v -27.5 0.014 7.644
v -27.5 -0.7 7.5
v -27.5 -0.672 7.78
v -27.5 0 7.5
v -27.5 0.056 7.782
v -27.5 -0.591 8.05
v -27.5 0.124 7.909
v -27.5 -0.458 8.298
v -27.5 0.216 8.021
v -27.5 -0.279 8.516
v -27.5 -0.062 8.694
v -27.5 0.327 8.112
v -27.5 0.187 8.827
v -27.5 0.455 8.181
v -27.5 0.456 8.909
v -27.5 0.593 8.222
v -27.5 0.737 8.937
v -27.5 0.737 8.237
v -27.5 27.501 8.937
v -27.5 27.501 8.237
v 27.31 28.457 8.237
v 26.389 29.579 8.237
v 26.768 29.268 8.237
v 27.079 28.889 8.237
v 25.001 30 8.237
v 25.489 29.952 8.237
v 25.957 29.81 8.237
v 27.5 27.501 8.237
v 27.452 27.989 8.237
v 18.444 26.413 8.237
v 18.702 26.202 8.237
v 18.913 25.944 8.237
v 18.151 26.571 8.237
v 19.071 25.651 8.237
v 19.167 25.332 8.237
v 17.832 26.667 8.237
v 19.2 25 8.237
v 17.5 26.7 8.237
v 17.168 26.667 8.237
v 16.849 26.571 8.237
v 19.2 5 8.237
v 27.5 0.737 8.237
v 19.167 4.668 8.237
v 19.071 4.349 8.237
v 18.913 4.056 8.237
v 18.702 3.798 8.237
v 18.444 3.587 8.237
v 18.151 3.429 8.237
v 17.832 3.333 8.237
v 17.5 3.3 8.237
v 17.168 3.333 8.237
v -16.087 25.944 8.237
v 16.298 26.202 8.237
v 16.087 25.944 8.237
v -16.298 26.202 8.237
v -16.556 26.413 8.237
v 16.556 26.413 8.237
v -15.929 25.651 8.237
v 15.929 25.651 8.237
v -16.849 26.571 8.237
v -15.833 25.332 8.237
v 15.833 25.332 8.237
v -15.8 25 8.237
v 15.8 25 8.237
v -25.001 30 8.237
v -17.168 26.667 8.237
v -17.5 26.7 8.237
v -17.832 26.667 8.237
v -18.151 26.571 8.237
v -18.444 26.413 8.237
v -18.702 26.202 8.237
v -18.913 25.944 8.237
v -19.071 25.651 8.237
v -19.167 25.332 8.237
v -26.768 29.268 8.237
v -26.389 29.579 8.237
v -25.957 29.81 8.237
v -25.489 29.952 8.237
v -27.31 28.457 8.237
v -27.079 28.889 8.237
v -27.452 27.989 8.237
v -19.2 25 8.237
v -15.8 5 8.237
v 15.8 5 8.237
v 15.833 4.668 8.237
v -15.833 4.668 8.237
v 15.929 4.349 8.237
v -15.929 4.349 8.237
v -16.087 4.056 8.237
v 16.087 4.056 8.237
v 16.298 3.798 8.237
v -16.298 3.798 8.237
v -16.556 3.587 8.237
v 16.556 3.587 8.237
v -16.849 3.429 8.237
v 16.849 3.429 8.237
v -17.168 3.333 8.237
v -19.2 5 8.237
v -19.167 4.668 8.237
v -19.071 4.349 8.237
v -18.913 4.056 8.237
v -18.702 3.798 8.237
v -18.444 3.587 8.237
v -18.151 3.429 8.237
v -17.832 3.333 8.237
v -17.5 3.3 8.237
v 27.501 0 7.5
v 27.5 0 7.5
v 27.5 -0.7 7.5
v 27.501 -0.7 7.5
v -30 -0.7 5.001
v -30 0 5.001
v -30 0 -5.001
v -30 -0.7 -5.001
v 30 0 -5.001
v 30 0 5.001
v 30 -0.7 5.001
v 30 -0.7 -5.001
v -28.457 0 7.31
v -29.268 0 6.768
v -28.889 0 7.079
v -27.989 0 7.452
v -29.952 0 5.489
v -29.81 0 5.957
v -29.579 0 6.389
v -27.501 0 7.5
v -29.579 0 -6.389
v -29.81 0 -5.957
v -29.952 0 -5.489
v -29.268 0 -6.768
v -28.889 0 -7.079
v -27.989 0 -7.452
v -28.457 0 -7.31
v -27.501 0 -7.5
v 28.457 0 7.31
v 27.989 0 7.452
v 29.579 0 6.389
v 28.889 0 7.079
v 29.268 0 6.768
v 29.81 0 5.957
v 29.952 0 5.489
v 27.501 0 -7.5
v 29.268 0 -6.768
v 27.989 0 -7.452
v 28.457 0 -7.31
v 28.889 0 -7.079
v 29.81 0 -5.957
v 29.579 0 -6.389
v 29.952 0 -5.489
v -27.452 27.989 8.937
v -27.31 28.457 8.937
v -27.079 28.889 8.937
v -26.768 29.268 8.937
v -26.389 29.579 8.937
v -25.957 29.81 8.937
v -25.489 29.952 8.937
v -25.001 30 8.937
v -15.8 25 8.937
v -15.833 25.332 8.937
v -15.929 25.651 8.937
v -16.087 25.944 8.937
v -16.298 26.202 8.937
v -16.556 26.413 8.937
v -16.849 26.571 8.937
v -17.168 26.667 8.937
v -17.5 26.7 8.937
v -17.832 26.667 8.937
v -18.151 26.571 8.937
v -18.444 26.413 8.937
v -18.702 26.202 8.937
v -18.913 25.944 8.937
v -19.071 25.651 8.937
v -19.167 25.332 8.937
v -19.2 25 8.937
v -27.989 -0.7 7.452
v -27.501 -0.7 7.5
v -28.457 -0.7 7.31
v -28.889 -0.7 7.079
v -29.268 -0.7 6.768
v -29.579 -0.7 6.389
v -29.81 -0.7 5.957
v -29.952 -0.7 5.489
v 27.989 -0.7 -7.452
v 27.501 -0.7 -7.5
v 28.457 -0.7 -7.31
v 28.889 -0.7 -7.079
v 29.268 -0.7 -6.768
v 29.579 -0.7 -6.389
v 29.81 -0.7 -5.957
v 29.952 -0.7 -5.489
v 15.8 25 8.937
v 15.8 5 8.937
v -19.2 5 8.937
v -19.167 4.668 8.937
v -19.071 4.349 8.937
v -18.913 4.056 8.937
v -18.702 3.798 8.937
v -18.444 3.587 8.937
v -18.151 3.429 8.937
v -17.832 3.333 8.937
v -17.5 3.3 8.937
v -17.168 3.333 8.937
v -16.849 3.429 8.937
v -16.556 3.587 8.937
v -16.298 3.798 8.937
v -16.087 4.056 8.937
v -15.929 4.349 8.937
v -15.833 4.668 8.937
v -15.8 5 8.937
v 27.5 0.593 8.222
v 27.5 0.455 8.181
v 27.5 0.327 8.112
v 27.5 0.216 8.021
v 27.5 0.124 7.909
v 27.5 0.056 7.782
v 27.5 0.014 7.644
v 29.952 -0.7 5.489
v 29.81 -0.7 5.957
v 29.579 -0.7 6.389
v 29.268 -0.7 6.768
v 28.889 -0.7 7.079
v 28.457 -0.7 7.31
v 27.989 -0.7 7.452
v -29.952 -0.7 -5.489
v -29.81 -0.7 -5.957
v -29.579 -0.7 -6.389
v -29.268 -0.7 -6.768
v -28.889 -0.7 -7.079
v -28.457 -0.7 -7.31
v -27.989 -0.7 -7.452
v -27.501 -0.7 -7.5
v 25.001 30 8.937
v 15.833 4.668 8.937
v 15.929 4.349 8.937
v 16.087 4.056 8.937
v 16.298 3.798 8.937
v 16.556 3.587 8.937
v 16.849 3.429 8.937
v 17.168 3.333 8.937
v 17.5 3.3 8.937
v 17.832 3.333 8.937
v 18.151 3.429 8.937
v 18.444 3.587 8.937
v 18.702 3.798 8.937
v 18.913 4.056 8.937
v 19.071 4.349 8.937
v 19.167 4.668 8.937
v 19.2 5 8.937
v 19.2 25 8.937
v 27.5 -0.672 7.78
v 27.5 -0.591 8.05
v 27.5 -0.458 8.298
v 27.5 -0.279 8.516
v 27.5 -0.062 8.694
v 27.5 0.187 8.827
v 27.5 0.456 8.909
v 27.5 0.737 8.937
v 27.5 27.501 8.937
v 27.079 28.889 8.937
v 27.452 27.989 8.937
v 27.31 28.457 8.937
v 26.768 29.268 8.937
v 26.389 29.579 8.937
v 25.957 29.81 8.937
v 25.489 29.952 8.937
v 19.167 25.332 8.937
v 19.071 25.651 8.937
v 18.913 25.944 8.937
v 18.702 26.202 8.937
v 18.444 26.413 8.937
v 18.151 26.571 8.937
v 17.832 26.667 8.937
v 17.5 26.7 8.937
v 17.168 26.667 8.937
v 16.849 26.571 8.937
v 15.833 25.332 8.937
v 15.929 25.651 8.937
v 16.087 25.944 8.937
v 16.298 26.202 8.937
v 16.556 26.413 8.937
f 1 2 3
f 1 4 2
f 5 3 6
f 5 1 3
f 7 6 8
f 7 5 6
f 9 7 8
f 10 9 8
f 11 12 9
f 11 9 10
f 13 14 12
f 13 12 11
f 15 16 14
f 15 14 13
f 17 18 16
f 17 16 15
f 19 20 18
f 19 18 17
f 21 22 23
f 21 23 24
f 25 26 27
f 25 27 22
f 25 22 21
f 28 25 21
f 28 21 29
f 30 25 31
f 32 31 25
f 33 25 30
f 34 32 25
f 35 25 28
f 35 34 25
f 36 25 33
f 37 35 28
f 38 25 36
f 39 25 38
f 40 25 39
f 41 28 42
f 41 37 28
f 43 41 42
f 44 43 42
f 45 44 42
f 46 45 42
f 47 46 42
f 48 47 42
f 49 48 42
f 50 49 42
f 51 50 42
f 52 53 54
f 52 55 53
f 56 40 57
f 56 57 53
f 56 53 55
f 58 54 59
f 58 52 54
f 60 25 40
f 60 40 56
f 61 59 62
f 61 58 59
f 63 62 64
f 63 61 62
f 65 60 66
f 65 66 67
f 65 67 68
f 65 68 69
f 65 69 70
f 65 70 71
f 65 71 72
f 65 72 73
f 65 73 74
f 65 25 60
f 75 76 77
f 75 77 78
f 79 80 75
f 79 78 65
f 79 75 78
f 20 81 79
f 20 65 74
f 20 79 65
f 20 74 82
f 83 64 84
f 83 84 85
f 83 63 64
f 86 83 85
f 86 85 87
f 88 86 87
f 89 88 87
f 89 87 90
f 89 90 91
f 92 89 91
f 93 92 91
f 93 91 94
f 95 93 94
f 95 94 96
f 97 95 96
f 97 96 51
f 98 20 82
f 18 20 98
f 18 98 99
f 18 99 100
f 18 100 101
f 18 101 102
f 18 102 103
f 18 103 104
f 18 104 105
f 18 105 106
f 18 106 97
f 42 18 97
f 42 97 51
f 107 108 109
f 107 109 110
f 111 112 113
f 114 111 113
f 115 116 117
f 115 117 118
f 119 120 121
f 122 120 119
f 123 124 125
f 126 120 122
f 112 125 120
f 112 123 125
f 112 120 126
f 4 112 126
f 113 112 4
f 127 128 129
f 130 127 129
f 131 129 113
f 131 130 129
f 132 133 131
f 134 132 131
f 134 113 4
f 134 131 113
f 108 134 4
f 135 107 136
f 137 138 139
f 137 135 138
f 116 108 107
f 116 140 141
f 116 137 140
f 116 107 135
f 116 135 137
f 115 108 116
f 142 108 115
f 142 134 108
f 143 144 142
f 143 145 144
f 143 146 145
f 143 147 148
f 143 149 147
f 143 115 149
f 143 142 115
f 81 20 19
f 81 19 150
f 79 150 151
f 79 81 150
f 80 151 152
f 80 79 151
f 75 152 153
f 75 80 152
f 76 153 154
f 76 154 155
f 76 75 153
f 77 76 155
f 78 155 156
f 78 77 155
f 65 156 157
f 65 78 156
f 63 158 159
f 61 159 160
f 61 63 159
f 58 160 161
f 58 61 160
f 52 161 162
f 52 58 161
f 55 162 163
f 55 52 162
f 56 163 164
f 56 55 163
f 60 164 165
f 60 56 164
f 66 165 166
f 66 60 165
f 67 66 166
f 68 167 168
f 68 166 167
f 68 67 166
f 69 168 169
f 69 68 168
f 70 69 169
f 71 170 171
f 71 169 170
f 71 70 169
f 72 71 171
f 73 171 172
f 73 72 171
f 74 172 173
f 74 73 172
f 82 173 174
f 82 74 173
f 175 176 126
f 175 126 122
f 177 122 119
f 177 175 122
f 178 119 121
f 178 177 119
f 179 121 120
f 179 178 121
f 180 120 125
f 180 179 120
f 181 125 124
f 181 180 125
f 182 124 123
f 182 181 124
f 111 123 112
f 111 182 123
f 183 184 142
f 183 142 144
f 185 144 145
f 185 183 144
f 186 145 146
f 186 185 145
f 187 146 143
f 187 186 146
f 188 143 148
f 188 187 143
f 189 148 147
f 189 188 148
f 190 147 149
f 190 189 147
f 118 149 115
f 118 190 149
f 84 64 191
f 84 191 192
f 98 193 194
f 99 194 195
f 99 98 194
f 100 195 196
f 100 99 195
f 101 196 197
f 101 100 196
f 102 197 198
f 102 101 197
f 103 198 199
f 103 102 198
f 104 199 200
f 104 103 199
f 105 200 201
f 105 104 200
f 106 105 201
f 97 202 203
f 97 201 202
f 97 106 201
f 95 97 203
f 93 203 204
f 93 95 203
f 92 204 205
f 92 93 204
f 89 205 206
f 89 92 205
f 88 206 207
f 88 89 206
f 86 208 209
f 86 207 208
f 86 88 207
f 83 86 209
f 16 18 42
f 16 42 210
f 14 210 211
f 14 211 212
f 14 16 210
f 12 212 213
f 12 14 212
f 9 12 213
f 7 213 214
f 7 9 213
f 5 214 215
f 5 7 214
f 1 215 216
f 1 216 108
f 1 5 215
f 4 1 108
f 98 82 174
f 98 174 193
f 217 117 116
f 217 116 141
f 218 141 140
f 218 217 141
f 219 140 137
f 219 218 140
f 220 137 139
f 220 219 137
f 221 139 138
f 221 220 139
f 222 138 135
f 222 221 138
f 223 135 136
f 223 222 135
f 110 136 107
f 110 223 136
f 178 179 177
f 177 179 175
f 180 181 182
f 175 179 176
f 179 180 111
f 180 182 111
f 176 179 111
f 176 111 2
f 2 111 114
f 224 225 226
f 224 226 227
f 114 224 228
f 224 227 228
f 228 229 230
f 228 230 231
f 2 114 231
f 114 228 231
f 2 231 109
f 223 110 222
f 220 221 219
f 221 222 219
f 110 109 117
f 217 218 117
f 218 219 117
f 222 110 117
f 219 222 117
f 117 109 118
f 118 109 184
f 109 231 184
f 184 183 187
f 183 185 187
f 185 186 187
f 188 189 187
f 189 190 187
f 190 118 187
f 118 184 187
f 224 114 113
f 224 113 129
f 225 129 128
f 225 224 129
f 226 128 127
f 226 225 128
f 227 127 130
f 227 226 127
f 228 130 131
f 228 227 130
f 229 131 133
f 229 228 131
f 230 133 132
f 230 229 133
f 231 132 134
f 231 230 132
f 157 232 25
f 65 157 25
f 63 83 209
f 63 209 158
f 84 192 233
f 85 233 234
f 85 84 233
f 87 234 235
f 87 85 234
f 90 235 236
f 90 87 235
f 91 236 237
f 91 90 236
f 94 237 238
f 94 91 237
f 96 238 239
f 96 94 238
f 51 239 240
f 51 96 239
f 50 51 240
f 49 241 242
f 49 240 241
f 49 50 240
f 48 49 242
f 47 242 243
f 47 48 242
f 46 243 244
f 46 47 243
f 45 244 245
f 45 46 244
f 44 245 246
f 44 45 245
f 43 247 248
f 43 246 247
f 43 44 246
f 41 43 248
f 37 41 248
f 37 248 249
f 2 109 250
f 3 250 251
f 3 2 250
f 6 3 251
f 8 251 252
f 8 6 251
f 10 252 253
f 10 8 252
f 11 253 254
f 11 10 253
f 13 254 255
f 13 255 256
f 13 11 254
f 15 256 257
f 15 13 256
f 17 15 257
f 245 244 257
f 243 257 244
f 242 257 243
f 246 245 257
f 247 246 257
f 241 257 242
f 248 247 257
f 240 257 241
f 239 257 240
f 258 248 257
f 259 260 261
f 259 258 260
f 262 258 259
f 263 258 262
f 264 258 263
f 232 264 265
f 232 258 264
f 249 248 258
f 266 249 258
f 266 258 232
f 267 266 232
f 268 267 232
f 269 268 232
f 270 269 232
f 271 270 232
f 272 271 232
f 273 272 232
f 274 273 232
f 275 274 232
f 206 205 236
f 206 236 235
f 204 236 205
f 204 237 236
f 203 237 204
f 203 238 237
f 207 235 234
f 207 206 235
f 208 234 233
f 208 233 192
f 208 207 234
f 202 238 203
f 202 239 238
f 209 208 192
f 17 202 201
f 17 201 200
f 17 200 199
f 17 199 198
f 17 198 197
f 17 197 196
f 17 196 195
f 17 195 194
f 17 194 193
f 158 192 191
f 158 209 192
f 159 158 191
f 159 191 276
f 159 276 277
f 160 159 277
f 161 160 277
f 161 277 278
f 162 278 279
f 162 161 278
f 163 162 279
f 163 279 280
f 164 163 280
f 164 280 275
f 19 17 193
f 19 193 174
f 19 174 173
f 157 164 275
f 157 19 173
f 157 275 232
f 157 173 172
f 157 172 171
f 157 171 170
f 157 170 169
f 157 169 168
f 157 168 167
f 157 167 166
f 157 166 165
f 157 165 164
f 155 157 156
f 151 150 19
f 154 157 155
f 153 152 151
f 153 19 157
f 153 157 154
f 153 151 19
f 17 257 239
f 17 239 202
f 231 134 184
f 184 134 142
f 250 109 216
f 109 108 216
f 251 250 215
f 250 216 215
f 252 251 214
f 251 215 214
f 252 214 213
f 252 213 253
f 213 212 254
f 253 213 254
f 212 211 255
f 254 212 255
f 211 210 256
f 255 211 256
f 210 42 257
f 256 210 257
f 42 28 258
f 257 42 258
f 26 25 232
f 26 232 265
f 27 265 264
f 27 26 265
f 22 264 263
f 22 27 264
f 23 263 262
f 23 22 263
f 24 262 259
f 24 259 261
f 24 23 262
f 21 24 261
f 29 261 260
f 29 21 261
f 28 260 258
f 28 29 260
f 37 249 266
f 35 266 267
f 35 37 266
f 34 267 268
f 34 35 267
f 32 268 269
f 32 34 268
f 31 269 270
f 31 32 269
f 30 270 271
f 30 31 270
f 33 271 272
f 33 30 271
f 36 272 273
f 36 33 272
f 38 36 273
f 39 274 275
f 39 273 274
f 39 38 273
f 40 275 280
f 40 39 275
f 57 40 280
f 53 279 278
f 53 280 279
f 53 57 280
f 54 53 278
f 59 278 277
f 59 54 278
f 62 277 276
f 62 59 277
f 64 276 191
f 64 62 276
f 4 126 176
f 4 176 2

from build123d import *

# Parameters (mm, degrees)
SKETCH1_W             = 60
SKETCH1_H             = 15
BASE_FLANGE1_DEPTH    = 0.7
EDGE_FLANGE1_DEPTH    = 55
CUT_EXTRUDE1_DEPTH    = 46.250862749
BREAK_CORNER1_START   = -0.7
BREAK_CORNER1_DEPTH   = 0.7
BREAK_CORNER1_START_2 = 8.2366
BREAK_CORNER1_2_DEPTH = 0.7


# Read off the part's stored shape, not the designer's step: Break-Corner1
# Sheet-metal steps are written as plain solids
with BuildPart() as part:
    # Sketch1 → Base-Flange1 (new body)
    with BuildSketch(Plane(origin=(0, 0, 0), x_dir=(1, 0, 0), z_dir=(0, 1, 0))):
        Rectangle(SKETCH1_W, SKETCH1_H)
    extrude(amount=-BASE_FLANGE1_DEPTH)

    # Edge-Flange1 section (across the edge) → Edge-Flange1 (add)
    with BuildSketch(Plane(origin=(-27.5, 0, 8.2366), x_dir=(0, 0, -1), z_dir=(1, 0, 0))):
        with BuildLine():
            Line((-0.7, 0.7366), (-0.7, 30))
            Line((-0.7, 30), (0, 30))
            Line((0, 30), (0, 0.7366))
            ThreePointArc((0, 0.7366), (0.215745145, 0.215745145), (0.7366, 0))
            Line((0.7366, 0), (0.7366, -0.7))
            ThreePointArc((0.7366, -0.7), (-0.279229602, -0.279229602), (-0.7, 0.7366))
        make_face()
    extrude(amount=EDGE_FLANGE1_DEPTH)

    # Sketch7 → Cut-Extrude1 (cut, through all)
    with BuildSketch(Plane(origin=(0, 0, 8.2366), x_dir=(-1, 0, 0), z_dir=(0, 0, -1))):
        with BuildLine():
            Line((-15.8, 25), (-15.8, 5))
            ThreePointArc((-15.8, 5), (-17.5, 3.3), (-19.2, 5))
            Line((-19.2, 5), (-19.2, 25))
            ThreePointArc((-19.2, 25), (-17.5, 26.7), (-15.8, 25))
        make_face()
        with BuildLine():
            Line((19.2, 25), (19.2, 5))
            ThreePointArc((19.2, 5), (17.5, 3.3), (15.8, 5))
            Line((15.8, 5), (15.8, 25))
            ThreePointArc((15.8, 25), (17.5, 26.7), (19.2, 25))
        make_face()
    extrude(amount=-CUT_EXTRUDE1_DEPTH, mode=Mode.SUBTRACT)

    # Break-Corner1 outline → Break-Corner1 (cut)
    with BuildSketch(Plane(origin=(0, 0, 0), x_dir=(1, 0, 0), z_dir=(0, 1, 0)).offset(BREAK_CORNER1_START)):
        with BuildLine():
            ThreePointArc((-27.501, -7.5), (-29.268059846, -6.768059846), (-30, -5.001))
            Line((-30, -5.001), (-30, -7.5))
            Line((-30, -7.5), (-27.501, -7.5))
        make_face()
        with BuildLine():
            ThreePointArc((-30, 5.001), (-29.268059846, 6.768059846), (-27.501, 7.5))
            Line((-27.501, 7.5), (-30, 7.5))
            Line((-30, 7.5), (-30, 5.001))
        make_face()
        with BuildLine():
            ThreePointArc((27.501, 7.5), (29.268059846, 6.768059846), (30, 5.001))
            Line((30, 5.001), (30, 7.5))
            Line((30, 7.5), (27.501, 7.5))
        make_face()
        with BuildLine():
            ThreePointArc((30, -5.001), (29.268059846, -6.768059846), (27.501, -7.5))
            Line((27.501, -7.5), (30, -7.5))
            Line((30, -7.5), (30, -5.001))
        make_face()
    extrude(amount=BREAK_CORNER1_DEPTH, mode=Mode.SUBTRACT)

    # Break-Corner1 2 outline → Break-Corner1 2 (cut)
    with BuildSketch(Plane.XY.offset(BREAK_CORNER1_START_2)):
        with BuildLine():
            Line((-27.5, 30), (-27.5, 27.501))
            ThreePointArc((-27.5, 27.501), (-26.768059846, 29.268059846), (-25.001, 30))
            Line((-25.001, 30), (-27.5, 30))
        make_face()
        with BuildLine():
            Line((27.5, 30), (25.001, 30))
            ThreePointArc((25.001, 30), (26.768059846, 29.268059846), (27.5, 27.501))
            Line((27.5, 27.501), (27.5, 30))
        make_face()
    extrude(amount=BREAK_CORNER1_2_DEPTH, mode=Mode.SUBTRACT)


solid = part.part
